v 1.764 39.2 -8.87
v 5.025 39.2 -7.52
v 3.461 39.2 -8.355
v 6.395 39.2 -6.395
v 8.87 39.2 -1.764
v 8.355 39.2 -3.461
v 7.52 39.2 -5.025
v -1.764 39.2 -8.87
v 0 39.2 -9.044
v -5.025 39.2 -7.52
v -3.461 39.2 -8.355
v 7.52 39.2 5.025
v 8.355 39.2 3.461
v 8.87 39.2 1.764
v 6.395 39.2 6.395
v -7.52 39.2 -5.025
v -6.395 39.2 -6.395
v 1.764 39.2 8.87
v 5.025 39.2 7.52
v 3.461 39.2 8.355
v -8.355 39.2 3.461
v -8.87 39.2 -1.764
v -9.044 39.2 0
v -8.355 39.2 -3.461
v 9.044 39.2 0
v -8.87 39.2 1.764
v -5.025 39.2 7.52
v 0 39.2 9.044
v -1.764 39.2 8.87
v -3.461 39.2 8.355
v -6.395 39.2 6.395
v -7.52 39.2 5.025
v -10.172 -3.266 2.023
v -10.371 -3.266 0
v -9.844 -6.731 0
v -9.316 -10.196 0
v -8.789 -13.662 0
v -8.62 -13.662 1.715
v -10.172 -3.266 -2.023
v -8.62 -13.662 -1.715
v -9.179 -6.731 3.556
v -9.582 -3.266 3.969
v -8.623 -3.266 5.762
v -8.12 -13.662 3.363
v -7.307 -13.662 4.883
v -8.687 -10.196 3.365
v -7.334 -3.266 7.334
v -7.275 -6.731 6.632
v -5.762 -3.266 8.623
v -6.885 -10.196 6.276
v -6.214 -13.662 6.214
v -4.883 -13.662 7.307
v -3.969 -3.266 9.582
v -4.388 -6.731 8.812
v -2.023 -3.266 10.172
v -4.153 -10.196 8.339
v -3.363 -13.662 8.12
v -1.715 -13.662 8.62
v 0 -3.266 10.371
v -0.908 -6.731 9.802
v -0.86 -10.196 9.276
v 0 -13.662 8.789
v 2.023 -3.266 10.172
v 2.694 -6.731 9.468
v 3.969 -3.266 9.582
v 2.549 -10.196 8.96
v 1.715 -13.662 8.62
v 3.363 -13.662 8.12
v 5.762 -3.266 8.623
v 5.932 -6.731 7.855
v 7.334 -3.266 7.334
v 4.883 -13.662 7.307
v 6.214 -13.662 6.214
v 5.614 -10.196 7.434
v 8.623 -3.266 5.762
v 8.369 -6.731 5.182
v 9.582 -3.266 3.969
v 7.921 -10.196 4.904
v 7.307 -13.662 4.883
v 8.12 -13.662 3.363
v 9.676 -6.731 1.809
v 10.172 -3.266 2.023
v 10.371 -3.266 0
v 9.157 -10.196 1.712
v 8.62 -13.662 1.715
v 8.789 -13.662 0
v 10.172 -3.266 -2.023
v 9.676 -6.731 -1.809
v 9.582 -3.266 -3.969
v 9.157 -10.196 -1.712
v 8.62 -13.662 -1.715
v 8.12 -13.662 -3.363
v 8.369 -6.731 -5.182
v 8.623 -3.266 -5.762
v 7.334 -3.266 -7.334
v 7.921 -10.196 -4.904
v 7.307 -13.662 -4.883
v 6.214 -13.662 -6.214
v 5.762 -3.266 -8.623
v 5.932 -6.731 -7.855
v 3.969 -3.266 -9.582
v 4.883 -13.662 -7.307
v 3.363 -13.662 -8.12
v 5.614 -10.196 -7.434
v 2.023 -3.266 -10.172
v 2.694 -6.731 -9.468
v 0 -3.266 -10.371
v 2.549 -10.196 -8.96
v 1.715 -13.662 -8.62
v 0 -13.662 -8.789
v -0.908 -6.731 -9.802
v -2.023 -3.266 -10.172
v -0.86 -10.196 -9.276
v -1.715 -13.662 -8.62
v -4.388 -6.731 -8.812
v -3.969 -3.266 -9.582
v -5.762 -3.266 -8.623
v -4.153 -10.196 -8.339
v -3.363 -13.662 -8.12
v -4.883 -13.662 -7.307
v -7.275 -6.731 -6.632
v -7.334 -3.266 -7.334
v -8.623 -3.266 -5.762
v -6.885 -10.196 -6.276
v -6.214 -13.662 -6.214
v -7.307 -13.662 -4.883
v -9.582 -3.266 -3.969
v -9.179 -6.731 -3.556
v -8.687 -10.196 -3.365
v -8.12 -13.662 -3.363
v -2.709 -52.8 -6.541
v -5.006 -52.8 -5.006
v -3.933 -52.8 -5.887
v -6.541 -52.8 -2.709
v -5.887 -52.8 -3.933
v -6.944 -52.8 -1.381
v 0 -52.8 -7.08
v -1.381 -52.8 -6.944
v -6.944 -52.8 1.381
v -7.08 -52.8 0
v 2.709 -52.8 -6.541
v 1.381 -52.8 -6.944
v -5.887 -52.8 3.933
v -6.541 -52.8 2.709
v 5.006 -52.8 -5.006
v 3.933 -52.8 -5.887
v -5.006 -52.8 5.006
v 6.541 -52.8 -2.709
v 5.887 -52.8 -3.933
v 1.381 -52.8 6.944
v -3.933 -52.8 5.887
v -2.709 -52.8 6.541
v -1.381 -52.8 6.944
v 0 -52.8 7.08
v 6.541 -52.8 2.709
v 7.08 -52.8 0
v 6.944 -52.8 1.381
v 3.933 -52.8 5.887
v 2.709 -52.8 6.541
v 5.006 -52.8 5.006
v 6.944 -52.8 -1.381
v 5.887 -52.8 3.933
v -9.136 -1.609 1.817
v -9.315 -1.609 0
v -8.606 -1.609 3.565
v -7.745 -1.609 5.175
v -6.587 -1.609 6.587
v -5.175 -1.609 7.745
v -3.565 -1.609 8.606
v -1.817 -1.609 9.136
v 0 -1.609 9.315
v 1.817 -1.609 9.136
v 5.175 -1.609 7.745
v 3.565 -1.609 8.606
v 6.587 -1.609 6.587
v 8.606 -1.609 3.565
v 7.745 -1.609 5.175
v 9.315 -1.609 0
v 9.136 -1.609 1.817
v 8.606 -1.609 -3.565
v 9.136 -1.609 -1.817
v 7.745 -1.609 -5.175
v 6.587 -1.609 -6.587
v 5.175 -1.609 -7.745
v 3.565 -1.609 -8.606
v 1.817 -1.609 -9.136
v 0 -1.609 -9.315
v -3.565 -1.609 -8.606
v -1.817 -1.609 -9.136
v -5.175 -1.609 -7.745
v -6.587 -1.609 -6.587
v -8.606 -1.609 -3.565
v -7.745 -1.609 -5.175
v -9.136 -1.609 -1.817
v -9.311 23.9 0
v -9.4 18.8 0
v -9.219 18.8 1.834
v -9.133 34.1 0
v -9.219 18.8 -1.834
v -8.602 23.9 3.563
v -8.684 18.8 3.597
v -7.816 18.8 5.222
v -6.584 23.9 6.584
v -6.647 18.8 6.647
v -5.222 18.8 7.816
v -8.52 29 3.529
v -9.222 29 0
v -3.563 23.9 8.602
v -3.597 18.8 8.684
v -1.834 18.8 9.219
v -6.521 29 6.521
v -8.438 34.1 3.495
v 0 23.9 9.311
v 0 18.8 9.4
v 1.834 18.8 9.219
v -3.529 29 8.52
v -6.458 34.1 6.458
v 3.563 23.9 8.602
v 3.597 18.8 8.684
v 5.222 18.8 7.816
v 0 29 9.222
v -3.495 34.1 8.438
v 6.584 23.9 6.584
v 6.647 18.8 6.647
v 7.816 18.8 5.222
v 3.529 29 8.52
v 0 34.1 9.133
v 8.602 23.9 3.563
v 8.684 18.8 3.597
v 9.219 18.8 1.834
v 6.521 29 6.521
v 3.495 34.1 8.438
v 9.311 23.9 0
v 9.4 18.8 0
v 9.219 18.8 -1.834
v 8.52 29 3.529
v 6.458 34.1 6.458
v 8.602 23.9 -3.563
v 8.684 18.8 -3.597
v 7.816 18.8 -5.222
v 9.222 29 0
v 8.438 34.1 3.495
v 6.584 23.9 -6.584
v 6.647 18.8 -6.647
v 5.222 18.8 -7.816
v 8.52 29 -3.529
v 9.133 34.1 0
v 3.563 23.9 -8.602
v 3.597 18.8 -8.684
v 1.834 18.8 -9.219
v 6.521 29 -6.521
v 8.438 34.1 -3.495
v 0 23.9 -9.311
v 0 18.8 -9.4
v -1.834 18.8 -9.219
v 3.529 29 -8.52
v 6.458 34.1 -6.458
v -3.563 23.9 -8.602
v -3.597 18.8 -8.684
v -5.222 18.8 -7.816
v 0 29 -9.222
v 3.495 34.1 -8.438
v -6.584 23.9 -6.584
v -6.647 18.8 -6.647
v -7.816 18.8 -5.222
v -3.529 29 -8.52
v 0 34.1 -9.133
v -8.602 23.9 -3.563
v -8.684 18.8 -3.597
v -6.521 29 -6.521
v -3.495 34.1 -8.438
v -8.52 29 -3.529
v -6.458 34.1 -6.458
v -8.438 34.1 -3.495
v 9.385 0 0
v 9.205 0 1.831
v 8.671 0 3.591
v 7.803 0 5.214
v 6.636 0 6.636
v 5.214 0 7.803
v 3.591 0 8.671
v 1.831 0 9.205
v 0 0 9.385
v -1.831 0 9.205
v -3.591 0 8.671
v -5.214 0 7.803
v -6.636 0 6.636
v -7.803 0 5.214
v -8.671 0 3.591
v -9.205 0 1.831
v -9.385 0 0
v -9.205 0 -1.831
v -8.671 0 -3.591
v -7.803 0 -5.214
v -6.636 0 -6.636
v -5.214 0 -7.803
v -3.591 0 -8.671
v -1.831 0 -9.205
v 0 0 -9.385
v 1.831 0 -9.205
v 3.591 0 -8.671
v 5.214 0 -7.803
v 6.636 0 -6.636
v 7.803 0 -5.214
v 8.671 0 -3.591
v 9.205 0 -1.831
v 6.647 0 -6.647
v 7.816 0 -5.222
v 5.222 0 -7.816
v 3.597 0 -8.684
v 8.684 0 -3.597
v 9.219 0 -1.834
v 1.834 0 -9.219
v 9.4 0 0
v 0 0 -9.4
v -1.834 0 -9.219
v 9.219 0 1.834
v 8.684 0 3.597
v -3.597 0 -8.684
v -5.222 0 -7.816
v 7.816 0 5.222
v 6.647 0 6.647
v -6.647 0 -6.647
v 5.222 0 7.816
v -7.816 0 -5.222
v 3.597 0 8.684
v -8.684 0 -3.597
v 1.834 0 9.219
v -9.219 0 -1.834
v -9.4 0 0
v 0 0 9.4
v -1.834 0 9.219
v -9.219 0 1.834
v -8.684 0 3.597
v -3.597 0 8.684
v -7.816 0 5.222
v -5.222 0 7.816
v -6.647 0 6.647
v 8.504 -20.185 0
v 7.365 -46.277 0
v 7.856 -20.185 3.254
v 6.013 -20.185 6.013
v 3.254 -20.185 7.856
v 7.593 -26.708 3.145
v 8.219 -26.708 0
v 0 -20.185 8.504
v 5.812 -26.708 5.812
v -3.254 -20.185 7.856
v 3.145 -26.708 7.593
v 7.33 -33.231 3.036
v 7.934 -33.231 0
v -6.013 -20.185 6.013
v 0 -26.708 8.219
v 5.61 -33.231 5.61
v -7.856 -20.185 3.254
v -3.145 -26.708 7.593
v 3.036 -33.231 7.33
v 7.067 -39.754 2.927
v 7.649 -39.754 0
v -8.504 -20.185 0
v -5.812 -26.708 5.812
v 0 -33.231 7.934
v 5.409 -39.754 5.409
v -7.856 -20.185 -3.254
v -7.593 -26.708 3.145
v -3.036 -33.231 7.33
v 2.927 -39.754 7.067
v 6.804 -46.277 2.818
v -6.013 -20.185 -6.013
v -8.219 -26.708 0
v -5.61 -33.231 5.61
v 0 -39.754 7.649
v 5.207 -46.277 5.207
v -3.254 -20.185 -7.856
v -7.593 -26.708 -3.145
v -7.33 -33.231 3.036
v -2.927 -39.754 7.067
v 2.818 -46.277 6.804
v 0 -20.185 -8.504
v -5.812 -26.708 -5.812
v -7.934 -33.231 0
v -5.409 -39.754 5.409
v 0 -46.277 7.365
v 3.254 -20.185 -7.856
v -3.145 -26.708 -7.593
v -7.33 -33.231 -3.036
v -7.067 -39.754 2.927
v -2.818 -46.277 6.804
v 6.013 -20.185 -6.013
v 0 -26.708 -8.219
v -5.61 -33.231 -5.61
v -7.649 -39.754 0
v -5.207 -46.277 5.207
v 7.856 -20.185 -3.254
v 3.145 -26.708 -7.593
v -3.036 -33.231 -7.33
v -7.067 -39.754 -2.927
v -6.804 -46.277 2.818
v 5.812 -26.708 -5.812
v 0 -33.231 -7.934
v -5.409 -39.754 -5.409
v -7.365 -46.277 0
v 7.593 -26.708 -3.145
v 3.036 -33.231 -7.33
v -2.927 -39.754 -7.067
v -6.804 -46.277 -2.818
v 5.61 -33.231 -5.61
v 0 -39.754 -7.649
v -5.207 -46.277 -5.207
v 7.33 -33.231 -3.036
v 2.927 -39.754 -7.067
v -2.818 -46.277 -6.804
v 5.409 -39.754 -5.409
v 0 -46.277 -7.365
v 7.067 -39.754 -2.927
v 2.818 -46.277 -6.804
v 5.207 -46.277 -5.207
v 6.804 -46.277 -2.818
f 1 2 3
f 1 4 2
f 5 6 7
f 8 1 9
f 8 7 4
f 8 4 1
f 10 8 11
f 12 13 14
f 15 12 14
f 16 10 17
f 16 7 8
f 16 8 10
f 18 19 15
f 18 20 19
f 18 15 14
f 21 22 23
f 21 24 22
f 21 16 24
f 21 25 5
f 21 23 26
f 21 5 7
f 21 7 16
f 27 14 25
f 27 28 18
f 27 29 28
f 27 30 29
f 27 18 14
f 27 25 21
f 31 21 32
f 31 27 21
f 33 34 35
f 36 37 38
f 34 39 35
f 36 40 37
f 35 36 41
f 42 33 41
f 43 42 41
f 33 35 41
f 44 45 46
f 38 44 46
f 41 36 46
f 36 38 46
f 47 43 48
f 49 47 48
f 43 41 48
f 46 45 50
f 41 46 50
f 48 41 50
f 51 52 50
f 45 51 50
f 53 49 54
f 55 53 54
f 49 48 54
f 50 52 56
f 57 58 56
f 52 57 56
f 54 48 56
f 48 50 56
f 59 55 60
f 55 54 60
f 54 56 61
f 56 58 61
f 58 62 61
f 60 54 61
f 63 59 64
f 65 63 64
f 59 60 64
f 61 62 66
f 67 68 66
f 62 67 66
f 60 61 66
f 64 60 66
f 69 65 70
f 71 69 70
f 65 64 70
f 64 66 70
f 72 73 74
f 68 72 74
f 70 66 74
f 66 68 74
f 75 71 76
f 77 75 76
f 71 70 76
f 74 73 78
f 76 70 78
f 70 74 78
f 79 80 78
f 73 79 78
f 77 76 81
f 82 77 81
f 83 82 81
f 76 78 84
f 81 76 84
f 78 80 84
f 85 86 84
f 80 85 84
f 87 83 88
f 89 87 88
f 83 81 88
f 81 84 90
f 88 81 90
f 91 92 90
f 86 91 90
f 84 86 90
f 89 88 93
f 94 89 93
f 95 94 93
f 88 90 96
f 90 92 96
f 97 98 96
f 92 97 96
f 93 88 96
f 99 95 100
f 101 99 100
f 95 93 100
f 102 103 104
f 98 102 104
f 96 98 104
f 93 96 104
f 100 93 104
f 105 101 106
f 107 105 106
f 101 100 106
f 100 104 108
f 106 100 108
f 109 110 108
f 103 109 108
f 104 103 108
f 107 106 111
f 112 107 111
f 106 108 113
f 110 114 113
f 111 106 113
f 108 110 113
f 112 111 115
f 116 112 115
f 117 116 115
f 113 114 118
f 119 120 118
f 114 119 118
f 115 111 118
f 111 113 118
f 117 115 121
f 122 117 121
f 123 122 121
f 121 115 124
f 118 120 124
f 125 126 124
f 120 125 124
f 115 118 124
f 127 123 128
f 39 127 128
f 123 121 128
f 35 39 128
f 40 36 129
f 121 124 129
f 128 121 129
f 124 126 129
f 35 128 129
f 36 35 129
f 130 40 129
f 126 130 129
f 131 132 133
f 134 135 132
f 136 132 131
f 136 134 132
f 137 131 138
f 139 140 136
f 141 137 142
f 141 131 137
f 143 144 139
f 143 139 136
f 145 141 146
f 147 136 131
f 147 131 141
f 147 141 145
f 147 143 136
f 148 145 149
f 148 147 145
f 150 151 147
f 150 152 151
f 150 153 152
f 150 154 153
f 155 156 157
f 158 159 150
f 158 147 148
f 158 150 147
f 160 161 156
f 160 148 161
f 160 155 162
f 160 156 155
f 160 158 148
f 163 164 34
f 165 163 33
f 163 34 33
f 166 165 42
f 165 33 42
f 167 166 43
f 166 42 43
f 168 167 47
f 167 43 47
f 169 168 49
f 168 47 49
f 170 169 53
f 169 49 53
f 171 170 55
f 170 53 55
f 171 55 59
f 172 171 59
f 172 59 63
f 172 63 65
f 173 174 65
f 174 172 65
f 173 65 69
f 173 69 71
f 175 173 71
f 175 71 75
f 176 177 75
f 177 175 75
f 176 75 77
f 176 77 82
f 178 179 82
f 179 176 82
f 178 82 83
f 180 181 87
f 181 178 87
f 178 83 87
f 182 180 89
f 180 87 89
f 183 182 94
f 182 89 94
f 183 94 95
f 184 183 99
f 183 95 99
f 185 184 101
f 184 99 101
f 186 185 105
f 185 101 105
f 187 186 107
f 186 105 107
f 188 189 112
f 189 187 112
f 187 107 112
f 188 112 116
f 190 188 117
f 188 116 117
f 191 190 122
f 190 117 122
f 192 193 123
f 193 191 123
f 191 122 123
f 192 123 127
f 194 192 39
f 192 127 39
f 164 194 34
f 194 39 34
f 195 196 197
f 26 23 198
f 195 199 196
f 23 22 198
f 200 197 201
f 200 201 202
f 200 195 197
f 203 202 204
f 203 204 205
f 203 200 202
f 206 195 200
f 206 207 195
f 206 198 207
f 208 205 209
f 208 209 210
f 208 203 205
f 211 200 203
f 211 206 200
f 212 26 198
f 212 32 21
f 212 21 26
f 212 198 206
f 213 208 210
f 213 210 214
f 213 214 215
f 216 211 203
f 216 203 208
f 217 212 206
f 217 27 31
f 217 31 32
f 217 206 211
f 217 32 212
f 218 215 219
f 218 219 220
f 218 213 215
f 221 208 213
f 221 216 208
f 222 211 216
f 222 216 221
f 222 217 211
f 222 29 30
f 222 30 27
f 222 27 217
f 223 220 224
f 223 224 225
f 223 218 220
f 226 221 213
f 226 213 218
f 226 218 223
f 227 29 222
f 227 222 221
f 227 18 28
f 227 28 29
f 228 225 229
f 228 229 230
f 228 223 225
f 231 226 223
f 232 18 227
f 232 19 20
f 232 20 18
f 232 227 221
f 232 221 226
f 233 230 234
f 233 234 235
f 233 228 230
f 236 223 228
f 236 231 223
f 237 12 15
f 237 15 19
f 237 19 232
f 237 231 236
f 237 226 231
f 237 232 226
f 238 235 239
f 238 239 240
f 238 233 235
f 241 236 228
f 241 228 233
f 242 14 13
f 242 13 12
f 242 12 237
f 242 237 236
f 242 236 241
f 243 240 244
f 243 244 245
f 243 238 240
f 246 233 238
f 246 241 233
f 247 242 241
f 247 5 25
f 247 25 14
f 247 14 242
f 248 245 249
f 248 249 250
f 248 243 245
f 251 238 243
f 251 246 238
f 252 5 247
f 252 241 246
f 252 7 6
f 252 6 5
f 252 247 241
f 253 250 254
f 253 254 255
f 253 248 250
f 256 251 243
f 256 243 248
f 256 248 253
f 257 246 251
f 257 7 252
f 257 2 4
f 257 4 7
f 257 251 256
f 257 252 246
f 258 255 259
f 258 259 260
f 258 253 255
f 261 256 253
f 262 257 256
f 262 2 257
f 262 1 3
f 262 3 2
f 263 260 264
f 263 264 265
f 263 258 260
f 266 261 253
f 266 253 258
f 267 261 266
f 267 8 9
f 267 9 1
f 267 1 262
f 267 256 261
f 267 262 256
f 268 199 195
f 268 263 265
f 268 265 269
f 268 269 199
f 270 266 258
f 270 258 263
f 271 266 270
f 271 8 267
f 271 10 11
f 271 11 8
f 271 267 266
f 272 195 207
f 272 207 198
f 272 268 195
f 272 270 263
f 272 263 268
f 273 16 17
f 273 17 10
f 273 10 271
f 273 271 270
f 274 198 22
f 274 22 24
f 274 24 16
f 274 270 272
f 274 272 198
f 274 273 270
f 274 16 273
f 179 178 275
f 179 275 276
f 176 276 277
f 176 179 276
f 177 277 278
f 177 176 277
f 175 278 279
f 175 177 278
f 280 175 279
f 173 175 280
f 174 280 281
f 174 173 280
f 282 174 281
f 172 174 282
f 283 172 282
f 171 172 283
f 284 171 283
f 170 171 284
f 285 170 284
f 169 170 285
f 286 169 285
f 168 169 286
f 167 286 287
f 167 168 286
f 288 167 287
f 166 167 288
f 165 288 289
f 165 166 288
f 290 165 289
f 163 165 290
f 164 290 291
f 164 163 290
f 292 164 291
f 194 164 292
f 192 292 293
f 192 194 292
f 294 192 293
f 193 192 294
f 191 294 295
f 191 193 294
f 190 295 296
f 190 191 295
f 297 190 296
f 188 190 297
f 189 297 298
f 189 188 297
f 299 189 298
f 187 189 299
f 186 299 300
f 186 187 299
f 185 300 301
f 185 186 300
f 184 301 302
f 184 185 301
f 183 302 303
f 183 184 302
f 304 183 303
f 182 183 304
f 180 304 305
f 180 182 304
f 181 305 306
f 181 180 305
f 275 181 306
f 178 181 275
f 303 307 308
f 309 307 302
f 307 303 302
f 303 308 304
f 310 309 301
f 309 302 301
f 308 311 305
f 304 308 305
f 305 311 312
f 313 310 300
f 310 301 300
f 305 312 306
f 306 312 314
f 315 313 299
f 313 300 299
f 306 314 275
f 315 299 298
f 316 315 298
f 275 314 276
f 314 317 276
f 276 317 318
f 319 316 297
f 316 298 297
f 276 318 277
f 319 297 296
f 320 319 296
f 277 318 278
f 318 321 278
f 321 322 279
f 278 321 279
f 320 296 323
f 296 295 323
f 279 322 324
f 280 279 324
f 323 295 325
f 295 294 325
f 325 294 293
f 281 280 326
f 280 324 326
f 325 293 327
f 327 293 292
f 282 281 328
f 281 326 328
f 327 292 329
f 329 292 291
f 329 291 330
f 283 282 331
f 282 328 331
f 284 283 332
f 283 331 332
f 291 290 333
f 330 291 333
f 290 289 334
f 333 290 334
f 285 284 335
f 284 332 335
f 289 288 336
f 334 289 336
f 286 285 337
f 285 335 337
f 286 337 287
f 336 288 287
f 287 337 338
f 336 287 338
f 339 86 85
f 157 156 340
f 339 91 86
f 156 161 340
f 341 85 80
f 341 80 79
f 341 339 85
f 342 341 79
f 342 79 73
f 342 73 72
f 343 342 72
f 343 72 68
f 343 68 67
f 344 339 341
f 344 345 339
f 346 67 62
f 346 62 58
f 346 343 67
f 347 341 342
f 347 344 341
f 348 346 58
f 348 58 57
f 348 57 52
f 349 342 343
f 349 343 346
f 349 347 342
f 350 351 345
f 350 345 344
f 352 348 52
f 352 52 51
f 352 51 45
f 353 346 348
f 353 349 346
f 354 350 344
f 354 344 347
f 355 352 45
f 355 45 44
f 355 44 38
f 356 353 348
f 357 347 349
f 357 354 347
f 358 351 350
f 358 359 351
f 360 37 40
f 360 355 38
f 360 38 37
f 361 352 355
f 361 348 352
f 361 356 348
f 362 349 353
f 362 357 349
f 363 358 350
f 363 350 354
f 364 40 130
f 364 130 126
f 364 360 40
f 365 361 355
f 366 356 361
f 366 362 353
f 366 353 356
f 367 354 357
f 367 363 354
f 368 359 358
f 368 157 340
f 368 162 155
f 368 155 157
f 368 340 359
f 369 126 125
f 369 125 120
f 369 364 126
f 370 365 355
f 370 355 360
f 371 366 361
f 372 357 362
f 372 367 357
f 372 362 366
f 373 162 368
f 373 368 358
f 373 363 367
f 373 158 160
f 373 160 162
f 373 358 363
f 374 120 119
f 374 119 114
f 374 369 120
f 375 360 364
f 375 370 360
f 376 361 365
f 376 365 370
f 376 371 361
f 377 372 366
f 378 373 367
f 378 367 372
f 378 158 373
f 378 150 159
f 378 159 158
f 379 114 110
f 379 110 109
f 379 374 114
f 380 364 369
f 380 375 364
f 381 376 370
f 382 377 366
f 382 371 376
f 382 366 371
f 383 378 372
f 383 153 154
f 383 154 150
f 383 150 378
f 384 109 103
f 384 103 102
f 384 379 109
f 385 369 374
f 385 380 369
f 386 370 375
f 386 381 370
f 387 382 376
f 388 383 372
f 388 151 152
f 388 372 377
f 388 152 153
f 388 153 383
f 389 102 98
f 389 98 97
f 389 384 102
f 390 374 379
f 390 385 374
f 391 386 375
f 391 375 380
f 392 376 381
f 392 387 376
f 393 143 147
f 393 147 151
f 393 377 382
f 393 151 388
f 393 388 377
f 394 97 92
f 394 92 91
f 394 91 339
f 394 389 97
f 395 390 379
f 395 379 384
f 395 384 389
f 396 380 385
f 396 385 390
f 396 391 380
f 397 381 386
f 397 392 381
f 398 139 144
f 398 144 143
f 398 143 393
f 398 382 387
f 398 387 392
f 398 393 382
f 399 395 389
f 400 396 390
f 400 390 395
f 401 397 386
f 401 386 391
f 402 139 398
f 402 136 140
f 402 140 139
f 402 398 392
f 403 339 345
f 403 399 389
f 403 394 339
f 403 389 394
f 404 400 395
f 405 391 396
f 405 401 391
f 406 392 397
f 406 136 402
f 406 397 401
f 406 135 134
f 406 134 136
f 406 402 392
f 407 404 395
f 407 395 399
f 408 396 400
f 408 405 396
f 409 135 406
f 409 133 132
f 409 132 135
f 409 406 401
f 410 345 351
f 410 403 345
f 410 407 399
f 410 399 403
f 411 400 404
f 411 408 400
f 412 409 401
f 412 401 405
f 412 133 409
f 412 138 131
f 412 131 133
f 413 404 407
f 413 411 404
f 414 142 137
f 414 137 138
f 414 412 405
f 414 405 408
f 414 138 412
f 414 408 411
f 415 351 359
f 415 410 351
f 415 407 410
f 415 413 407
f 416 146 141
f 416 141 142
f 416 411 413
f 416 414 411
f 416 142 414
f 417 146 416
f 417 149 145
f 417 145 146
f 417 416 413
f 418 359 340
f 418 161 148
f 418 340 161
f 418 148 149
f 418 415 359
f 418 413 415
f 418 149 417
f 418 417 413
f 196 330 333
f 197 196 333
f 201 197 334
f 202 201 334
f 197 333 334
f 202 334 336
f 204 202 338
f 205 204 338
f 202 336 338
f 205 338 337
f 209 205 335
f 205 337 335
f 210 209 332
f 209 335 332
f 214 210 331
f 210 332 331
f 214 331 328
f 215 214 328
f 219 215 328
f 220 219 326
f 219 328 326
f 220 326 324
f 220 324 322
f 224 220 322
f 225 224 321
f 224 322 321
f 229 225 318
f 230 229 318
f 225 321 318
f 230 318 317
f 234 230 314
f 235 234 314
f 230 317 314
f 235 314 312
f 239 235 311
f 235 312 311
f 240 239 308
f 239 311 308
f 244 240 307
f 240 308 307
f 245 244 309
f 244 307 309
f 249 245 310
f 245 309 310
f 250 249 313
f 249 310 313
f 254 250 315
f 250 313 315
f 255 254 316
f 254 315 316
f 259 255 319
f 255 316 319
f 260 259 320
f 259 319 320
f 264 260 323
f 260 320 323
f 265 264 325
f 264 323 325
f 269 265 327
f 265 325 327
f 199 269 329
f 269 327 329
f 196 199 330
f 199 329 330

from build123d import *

# Parameters (mm, degrees)
F0_R     = 9.385
F1_DEPTH = 52.8
F1_TAPER = 2.5
F2_R     = 9.4
F3_DEPTH = 18.8
F4_R     = 9.4
F5_DEPTH = 20.4
F5_TAPER = 1


with BuildPart() as f1:
    # F0 (on Front) → F1 (new body)
    with BuildSketch(Plane.XZ):
        Circle(F0_R)
    extrude(amount=F1_DEPTH, taper=F1_TAPER)

    # F2 (on face) → F3 (join)
    with BuildSketch(Plane(origin=(0, 0, 0), x_dir=(-1, 0, 0), z_dir=(0, 1, 0))):
        Circle(F2_R)
    extrude(amount=F3_DEPTH)

    # F4 (on face) → F5 (join)
    with BuildSketch(Plane(origin=(0, 18.8, 0), x_dir=(-1, 0, 0), z_dir=(0, 1, 0))):
        Circle(F4_R)
    extrude(amount=F5_DEPTH, taper=F5_TAPER)

    # F6 (on Top) → F7 (revolve)
    with BuildSketch(Plane.XY):
        Polygon((-8.708294537, -14.1886593821), (-9.2448791865, -1.5), (-10.3712912667, -3.2655011038), align=None)
    revolve(axis=Axis((0, -52.8, 0), (0, 1, 0)))


solid = f1.part
